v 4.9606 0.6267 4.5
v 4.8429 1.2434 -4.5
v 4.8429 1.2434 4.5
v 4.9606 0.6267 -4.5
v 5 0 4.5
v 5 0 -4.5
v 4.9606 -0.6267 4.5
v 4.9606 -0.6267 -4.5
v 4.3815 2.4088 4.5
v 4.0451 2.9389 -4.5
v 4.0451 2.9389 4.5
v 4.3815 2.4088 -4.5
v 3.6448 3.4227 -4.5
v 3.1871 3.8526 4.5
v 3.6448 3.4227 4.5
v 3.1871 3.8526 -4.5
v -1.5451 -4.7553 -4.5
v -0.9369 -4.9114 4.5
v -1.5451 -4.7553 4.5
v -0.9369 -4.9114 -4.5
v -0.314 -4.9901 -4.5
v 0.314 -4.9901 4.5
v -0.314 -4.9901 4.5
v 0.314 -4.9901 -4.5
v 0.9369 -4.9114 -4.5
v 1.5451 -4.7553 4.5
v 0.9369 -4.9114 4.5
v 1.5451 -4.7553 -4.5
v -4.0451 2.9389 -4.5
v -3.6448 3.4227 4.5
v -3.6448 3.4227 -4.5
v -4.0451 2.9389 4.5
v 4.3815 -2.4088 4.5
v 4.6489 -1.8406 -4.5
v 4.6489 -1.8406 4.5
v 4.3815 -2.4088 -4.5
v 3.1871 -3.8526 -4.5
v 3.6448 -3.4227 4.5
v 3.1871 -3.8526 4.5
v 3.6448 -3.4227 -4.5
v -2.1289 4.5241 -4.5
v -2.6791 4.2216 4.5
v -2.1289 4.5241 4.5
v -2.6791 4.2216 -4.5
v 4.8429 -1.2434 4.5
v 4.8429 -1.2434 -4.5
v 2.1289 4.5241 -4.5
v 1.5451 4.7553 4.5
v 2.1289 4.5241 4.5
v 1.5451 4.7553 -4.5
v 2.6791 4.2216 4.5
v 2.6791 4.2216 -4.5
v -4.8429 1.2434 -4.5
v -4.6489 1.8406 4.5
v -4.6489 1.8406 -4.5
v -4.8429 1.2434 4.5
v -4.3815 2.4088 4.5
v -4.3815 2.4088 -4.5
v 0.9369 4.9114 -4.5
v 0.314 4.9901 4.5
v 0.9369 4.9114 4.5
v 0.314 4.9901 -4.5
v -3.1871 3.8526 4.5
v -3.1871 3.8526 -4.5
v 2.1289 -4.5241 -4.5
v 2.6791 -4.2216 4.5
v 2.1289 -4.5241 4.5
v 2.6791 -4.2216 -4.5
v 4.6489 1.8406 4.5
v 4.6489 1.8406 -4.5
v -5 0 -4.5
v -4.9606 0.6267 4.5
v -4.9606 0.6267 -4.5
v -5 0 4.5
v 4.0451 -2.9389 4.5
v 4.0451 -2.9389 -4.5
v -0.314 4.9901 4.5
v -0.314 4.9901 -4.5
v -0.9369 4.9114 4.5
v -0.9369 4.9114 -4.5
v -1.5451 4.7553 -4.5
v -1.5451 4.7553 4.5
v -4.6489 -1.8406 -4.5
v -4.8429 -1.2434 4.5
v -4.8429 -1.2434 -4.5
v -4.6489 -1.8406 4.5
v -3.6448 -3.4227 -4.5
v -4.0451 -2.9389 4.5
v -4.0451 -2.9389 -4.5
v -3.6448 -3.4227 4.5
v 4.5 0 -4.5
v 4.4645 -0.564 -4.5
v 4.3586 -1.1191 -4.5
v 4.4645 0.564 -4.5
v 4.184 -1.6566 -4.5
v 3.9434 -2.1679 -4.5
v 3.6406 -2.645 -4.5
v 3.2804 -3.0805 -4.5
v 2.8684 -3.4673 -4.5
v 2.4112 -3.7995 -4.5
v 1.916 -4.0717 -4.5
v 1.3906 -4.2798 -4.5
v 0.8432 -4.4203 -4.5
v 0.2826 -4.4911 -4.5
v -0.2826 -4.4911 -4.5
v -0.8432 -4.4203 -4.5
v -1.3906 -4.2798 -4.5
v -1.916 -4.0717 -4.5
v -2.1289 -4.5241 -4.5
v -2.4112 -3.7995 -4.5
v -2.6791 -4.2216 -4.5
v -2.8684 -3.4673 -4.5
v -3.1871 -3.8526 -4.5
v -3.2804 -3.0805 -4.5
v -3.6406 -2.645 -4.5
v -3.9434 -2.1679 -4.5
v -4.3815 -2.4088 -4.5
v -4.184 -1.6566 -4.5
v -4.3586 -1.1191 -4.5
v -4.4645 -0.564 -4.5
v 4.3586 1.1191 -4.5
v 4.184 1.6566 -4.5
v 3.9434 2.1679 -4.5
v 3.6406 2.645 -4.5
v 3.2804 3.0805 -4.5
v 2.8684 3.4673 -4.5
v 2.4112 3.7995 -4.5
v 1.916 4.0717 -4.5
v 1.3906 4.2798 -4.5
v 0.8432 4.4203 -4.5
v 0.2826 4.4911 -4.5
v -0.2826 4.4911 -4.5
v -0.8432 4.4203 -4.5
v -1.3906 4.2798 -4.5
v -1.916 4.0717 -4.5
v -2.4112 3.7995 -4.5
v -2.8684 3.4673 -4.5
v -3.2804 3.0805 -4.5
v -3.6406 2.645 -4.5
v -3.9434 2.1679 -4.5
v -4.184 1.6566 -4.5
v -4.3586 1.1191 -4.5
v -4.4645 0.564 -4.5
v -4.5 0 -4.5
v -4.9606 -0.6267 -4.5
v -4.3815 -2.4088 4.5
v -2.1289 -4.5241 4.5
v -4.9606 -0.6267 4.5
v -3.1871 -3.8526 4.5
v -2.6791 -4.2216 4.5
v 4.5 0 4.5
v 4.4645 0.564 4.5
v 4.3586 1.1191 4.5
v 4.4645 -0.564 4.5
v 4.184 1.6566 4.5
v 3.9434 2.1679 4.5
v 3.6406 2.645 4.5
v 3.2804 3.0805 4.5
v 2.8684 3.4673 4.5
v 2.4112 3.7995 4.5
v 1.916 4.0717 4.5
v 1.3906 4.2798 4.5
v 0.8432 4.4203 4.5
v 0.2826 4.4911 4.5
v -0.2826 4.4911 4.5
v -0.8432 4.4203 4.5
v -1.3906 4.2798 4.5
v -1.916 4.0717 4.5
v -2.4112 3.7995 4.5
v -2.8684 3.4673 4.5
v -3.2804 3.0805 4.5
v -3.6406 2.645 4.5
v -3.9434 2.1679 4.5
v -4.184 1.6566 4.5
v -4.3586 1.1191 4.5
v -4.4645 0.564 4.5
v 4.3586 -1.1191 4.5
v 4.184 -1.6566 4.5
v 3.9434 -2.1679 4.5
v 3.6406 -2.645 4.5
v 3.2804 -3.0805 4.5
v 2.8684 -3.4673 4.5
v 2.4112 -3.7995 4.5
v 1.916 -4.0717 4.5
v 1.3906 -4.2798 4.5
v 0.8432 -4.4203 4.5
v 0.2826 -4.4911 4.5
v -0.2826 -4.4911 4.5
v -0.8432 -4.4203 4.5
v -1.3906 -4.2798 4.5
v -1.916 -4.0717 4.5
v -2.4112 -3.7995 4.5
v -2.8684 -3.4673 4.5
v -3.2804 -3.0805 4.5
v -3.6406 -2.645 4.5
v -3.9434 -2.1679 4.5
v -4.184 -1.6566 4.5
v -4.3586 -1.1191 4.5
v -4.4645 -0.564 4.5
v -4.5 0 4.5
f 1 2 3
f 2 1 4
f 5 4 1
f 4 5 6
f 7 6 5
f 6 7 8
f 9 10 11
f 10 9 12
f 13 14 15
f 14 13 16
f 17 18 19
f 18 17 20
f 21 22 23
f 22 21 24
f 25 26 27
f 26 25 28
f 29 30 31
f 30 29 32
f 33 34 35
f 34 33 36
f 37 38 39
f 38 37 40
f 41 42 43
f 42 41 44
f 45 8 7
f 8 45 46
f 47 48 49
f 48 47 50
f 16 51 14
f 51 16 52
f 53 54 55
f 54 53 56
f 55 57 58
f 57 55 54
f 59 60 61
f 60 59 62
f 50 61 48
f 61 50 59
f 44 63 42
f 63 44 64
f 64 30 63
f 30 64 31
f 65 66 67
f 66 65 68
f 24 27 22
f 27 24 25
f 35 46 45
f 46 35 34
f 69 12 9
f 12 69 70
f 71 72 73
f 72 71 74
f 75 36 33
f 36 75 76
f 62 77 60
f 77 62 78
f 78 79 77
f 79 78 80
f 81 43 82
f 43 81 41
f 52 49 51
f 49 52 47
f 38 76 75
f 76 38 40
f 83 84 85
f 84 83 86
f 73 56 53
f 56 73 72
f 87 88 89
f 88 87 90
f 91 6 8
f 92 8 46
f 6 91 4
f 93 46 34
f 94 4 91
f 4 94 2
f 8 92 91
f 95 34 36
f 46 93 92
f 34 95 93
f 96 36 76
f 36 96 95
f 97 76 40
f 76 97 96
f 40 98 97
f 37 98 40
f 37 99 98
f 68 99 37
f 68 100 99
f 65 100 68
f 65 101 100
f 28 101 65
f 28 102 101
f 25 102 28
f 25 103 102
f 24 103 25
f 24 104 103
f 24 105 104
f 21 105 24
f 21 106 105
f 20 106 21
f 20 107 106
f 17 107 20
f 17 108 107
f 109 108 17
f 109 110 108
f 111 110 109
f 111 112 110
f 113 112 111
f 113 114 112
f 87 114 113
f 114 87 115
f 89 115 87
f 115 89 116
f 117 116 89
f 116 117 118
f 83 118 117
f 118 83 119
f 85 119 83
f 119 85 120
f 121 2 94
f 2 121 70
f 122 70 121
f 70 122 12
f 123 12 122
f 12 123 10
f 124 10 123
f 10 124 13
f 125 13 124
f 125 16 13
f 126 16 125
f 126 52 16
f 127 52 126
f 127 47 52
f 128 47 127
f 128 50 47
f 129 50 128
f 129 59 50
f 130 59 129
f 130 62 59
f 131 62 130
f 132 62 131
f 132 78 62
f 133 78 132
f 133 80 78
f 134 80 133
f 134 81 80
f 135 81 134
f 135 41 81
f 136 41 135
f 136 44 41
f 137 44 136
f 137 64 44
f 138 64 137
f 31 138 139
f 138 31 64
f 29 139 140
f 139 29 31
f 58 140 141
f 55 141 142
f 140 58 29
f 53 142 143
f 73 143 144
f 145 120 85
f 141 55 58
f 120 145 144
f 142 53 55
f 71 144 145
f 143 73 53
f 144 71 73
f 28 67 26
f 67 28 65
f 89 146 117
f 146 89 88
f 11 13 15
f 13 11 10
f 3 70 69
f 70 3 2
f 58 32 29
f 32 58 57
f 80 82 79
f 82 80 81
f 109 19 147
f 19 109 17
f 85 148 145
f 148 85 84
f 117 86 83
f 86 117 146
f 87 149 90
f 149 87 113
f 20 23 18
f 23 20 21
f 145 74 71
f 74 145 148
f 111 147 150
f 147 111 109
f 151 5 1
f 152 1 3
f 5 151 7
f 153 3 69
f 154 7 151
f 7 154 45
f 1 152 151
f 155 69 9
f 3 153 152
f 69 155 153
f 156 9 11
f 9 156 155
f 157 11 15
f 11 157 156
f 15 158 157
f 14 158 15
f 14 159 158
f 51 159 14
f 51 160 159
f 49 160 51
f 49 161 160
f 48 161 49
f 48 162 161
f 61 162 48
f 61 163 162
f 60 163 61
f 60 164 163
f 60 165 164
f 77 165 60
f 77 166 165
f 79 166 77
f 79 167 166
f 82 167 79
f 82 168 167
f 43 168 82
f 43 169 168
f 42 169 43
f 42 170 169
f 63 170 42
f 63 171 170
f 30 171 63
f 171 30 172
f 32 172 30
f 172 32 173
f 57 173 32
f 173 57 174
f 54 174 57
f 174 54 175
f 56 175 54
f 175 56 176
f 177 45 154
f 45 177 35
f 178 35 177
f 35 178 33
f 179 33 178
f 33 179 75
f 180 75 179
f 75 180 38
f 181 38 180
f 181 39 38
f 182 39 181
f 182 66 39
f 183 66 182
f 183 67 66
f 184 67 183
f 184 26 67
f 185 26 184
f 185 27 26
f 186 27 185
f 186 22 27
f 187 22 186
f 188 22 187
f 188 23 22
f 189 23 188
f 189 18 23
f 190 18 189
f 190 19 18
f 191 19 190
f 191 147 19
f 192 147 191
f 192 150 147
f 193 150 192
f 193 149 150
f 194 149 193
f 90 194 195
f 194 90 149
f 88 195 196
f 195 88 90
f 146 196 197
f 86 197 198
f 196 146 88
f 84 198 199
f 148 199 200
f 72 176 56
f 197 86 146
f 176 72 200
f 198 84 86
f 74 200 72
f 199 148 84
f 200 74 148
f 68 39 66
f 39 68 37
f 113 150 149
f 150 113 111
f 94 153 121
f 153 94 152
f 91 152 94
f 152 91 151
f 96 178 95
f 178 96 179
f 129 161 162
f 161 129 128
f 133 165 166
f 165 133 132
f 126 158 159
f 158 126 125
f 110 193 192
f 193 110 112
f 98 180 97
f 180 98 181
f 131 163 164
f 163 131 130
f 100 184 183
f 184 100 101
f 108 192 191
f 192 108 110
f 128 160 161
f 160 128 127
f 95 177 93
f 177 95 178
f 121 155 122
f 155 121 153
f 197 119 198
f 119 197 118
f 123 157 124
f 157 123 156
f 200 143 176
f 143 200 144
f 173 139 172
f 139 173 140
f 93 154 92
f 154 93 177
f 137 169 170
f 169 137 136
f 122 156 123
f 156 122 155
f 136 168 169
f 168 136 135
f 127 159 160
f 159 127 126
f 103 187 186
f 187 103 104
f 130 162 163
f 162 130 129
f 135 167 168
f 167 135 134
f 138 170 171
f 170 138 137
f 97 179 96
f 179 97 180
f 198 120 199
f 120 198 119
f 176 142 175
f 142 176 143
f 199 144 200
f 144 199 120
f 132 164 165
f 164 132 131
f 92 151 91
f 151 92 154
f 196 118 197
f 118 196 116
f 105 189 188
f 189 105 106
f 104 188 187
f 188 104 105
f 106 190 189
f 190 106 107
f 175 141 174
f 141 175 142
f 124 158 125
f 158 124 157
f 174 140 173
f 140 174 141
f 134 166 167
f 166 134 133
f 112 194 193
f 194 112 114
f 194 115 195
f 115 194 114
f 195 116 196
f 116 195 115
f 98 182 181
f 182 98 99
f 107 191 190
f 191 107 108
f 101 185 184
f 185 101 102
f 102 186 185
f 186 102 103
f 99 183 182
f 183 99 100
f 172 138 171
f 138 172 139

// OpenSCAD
$fn = 50;


difference() {
	union() {
		translate(v = [0, 0, -4.5000000000]) {
			cylinder(h = 9, r = 5.0000000000);
		}
	}
	union() {
		translate(v = [0, 0, -100.0000000000]) {
			cylinder(h = 200, r = 4.5000000000);
		}
	}
}
